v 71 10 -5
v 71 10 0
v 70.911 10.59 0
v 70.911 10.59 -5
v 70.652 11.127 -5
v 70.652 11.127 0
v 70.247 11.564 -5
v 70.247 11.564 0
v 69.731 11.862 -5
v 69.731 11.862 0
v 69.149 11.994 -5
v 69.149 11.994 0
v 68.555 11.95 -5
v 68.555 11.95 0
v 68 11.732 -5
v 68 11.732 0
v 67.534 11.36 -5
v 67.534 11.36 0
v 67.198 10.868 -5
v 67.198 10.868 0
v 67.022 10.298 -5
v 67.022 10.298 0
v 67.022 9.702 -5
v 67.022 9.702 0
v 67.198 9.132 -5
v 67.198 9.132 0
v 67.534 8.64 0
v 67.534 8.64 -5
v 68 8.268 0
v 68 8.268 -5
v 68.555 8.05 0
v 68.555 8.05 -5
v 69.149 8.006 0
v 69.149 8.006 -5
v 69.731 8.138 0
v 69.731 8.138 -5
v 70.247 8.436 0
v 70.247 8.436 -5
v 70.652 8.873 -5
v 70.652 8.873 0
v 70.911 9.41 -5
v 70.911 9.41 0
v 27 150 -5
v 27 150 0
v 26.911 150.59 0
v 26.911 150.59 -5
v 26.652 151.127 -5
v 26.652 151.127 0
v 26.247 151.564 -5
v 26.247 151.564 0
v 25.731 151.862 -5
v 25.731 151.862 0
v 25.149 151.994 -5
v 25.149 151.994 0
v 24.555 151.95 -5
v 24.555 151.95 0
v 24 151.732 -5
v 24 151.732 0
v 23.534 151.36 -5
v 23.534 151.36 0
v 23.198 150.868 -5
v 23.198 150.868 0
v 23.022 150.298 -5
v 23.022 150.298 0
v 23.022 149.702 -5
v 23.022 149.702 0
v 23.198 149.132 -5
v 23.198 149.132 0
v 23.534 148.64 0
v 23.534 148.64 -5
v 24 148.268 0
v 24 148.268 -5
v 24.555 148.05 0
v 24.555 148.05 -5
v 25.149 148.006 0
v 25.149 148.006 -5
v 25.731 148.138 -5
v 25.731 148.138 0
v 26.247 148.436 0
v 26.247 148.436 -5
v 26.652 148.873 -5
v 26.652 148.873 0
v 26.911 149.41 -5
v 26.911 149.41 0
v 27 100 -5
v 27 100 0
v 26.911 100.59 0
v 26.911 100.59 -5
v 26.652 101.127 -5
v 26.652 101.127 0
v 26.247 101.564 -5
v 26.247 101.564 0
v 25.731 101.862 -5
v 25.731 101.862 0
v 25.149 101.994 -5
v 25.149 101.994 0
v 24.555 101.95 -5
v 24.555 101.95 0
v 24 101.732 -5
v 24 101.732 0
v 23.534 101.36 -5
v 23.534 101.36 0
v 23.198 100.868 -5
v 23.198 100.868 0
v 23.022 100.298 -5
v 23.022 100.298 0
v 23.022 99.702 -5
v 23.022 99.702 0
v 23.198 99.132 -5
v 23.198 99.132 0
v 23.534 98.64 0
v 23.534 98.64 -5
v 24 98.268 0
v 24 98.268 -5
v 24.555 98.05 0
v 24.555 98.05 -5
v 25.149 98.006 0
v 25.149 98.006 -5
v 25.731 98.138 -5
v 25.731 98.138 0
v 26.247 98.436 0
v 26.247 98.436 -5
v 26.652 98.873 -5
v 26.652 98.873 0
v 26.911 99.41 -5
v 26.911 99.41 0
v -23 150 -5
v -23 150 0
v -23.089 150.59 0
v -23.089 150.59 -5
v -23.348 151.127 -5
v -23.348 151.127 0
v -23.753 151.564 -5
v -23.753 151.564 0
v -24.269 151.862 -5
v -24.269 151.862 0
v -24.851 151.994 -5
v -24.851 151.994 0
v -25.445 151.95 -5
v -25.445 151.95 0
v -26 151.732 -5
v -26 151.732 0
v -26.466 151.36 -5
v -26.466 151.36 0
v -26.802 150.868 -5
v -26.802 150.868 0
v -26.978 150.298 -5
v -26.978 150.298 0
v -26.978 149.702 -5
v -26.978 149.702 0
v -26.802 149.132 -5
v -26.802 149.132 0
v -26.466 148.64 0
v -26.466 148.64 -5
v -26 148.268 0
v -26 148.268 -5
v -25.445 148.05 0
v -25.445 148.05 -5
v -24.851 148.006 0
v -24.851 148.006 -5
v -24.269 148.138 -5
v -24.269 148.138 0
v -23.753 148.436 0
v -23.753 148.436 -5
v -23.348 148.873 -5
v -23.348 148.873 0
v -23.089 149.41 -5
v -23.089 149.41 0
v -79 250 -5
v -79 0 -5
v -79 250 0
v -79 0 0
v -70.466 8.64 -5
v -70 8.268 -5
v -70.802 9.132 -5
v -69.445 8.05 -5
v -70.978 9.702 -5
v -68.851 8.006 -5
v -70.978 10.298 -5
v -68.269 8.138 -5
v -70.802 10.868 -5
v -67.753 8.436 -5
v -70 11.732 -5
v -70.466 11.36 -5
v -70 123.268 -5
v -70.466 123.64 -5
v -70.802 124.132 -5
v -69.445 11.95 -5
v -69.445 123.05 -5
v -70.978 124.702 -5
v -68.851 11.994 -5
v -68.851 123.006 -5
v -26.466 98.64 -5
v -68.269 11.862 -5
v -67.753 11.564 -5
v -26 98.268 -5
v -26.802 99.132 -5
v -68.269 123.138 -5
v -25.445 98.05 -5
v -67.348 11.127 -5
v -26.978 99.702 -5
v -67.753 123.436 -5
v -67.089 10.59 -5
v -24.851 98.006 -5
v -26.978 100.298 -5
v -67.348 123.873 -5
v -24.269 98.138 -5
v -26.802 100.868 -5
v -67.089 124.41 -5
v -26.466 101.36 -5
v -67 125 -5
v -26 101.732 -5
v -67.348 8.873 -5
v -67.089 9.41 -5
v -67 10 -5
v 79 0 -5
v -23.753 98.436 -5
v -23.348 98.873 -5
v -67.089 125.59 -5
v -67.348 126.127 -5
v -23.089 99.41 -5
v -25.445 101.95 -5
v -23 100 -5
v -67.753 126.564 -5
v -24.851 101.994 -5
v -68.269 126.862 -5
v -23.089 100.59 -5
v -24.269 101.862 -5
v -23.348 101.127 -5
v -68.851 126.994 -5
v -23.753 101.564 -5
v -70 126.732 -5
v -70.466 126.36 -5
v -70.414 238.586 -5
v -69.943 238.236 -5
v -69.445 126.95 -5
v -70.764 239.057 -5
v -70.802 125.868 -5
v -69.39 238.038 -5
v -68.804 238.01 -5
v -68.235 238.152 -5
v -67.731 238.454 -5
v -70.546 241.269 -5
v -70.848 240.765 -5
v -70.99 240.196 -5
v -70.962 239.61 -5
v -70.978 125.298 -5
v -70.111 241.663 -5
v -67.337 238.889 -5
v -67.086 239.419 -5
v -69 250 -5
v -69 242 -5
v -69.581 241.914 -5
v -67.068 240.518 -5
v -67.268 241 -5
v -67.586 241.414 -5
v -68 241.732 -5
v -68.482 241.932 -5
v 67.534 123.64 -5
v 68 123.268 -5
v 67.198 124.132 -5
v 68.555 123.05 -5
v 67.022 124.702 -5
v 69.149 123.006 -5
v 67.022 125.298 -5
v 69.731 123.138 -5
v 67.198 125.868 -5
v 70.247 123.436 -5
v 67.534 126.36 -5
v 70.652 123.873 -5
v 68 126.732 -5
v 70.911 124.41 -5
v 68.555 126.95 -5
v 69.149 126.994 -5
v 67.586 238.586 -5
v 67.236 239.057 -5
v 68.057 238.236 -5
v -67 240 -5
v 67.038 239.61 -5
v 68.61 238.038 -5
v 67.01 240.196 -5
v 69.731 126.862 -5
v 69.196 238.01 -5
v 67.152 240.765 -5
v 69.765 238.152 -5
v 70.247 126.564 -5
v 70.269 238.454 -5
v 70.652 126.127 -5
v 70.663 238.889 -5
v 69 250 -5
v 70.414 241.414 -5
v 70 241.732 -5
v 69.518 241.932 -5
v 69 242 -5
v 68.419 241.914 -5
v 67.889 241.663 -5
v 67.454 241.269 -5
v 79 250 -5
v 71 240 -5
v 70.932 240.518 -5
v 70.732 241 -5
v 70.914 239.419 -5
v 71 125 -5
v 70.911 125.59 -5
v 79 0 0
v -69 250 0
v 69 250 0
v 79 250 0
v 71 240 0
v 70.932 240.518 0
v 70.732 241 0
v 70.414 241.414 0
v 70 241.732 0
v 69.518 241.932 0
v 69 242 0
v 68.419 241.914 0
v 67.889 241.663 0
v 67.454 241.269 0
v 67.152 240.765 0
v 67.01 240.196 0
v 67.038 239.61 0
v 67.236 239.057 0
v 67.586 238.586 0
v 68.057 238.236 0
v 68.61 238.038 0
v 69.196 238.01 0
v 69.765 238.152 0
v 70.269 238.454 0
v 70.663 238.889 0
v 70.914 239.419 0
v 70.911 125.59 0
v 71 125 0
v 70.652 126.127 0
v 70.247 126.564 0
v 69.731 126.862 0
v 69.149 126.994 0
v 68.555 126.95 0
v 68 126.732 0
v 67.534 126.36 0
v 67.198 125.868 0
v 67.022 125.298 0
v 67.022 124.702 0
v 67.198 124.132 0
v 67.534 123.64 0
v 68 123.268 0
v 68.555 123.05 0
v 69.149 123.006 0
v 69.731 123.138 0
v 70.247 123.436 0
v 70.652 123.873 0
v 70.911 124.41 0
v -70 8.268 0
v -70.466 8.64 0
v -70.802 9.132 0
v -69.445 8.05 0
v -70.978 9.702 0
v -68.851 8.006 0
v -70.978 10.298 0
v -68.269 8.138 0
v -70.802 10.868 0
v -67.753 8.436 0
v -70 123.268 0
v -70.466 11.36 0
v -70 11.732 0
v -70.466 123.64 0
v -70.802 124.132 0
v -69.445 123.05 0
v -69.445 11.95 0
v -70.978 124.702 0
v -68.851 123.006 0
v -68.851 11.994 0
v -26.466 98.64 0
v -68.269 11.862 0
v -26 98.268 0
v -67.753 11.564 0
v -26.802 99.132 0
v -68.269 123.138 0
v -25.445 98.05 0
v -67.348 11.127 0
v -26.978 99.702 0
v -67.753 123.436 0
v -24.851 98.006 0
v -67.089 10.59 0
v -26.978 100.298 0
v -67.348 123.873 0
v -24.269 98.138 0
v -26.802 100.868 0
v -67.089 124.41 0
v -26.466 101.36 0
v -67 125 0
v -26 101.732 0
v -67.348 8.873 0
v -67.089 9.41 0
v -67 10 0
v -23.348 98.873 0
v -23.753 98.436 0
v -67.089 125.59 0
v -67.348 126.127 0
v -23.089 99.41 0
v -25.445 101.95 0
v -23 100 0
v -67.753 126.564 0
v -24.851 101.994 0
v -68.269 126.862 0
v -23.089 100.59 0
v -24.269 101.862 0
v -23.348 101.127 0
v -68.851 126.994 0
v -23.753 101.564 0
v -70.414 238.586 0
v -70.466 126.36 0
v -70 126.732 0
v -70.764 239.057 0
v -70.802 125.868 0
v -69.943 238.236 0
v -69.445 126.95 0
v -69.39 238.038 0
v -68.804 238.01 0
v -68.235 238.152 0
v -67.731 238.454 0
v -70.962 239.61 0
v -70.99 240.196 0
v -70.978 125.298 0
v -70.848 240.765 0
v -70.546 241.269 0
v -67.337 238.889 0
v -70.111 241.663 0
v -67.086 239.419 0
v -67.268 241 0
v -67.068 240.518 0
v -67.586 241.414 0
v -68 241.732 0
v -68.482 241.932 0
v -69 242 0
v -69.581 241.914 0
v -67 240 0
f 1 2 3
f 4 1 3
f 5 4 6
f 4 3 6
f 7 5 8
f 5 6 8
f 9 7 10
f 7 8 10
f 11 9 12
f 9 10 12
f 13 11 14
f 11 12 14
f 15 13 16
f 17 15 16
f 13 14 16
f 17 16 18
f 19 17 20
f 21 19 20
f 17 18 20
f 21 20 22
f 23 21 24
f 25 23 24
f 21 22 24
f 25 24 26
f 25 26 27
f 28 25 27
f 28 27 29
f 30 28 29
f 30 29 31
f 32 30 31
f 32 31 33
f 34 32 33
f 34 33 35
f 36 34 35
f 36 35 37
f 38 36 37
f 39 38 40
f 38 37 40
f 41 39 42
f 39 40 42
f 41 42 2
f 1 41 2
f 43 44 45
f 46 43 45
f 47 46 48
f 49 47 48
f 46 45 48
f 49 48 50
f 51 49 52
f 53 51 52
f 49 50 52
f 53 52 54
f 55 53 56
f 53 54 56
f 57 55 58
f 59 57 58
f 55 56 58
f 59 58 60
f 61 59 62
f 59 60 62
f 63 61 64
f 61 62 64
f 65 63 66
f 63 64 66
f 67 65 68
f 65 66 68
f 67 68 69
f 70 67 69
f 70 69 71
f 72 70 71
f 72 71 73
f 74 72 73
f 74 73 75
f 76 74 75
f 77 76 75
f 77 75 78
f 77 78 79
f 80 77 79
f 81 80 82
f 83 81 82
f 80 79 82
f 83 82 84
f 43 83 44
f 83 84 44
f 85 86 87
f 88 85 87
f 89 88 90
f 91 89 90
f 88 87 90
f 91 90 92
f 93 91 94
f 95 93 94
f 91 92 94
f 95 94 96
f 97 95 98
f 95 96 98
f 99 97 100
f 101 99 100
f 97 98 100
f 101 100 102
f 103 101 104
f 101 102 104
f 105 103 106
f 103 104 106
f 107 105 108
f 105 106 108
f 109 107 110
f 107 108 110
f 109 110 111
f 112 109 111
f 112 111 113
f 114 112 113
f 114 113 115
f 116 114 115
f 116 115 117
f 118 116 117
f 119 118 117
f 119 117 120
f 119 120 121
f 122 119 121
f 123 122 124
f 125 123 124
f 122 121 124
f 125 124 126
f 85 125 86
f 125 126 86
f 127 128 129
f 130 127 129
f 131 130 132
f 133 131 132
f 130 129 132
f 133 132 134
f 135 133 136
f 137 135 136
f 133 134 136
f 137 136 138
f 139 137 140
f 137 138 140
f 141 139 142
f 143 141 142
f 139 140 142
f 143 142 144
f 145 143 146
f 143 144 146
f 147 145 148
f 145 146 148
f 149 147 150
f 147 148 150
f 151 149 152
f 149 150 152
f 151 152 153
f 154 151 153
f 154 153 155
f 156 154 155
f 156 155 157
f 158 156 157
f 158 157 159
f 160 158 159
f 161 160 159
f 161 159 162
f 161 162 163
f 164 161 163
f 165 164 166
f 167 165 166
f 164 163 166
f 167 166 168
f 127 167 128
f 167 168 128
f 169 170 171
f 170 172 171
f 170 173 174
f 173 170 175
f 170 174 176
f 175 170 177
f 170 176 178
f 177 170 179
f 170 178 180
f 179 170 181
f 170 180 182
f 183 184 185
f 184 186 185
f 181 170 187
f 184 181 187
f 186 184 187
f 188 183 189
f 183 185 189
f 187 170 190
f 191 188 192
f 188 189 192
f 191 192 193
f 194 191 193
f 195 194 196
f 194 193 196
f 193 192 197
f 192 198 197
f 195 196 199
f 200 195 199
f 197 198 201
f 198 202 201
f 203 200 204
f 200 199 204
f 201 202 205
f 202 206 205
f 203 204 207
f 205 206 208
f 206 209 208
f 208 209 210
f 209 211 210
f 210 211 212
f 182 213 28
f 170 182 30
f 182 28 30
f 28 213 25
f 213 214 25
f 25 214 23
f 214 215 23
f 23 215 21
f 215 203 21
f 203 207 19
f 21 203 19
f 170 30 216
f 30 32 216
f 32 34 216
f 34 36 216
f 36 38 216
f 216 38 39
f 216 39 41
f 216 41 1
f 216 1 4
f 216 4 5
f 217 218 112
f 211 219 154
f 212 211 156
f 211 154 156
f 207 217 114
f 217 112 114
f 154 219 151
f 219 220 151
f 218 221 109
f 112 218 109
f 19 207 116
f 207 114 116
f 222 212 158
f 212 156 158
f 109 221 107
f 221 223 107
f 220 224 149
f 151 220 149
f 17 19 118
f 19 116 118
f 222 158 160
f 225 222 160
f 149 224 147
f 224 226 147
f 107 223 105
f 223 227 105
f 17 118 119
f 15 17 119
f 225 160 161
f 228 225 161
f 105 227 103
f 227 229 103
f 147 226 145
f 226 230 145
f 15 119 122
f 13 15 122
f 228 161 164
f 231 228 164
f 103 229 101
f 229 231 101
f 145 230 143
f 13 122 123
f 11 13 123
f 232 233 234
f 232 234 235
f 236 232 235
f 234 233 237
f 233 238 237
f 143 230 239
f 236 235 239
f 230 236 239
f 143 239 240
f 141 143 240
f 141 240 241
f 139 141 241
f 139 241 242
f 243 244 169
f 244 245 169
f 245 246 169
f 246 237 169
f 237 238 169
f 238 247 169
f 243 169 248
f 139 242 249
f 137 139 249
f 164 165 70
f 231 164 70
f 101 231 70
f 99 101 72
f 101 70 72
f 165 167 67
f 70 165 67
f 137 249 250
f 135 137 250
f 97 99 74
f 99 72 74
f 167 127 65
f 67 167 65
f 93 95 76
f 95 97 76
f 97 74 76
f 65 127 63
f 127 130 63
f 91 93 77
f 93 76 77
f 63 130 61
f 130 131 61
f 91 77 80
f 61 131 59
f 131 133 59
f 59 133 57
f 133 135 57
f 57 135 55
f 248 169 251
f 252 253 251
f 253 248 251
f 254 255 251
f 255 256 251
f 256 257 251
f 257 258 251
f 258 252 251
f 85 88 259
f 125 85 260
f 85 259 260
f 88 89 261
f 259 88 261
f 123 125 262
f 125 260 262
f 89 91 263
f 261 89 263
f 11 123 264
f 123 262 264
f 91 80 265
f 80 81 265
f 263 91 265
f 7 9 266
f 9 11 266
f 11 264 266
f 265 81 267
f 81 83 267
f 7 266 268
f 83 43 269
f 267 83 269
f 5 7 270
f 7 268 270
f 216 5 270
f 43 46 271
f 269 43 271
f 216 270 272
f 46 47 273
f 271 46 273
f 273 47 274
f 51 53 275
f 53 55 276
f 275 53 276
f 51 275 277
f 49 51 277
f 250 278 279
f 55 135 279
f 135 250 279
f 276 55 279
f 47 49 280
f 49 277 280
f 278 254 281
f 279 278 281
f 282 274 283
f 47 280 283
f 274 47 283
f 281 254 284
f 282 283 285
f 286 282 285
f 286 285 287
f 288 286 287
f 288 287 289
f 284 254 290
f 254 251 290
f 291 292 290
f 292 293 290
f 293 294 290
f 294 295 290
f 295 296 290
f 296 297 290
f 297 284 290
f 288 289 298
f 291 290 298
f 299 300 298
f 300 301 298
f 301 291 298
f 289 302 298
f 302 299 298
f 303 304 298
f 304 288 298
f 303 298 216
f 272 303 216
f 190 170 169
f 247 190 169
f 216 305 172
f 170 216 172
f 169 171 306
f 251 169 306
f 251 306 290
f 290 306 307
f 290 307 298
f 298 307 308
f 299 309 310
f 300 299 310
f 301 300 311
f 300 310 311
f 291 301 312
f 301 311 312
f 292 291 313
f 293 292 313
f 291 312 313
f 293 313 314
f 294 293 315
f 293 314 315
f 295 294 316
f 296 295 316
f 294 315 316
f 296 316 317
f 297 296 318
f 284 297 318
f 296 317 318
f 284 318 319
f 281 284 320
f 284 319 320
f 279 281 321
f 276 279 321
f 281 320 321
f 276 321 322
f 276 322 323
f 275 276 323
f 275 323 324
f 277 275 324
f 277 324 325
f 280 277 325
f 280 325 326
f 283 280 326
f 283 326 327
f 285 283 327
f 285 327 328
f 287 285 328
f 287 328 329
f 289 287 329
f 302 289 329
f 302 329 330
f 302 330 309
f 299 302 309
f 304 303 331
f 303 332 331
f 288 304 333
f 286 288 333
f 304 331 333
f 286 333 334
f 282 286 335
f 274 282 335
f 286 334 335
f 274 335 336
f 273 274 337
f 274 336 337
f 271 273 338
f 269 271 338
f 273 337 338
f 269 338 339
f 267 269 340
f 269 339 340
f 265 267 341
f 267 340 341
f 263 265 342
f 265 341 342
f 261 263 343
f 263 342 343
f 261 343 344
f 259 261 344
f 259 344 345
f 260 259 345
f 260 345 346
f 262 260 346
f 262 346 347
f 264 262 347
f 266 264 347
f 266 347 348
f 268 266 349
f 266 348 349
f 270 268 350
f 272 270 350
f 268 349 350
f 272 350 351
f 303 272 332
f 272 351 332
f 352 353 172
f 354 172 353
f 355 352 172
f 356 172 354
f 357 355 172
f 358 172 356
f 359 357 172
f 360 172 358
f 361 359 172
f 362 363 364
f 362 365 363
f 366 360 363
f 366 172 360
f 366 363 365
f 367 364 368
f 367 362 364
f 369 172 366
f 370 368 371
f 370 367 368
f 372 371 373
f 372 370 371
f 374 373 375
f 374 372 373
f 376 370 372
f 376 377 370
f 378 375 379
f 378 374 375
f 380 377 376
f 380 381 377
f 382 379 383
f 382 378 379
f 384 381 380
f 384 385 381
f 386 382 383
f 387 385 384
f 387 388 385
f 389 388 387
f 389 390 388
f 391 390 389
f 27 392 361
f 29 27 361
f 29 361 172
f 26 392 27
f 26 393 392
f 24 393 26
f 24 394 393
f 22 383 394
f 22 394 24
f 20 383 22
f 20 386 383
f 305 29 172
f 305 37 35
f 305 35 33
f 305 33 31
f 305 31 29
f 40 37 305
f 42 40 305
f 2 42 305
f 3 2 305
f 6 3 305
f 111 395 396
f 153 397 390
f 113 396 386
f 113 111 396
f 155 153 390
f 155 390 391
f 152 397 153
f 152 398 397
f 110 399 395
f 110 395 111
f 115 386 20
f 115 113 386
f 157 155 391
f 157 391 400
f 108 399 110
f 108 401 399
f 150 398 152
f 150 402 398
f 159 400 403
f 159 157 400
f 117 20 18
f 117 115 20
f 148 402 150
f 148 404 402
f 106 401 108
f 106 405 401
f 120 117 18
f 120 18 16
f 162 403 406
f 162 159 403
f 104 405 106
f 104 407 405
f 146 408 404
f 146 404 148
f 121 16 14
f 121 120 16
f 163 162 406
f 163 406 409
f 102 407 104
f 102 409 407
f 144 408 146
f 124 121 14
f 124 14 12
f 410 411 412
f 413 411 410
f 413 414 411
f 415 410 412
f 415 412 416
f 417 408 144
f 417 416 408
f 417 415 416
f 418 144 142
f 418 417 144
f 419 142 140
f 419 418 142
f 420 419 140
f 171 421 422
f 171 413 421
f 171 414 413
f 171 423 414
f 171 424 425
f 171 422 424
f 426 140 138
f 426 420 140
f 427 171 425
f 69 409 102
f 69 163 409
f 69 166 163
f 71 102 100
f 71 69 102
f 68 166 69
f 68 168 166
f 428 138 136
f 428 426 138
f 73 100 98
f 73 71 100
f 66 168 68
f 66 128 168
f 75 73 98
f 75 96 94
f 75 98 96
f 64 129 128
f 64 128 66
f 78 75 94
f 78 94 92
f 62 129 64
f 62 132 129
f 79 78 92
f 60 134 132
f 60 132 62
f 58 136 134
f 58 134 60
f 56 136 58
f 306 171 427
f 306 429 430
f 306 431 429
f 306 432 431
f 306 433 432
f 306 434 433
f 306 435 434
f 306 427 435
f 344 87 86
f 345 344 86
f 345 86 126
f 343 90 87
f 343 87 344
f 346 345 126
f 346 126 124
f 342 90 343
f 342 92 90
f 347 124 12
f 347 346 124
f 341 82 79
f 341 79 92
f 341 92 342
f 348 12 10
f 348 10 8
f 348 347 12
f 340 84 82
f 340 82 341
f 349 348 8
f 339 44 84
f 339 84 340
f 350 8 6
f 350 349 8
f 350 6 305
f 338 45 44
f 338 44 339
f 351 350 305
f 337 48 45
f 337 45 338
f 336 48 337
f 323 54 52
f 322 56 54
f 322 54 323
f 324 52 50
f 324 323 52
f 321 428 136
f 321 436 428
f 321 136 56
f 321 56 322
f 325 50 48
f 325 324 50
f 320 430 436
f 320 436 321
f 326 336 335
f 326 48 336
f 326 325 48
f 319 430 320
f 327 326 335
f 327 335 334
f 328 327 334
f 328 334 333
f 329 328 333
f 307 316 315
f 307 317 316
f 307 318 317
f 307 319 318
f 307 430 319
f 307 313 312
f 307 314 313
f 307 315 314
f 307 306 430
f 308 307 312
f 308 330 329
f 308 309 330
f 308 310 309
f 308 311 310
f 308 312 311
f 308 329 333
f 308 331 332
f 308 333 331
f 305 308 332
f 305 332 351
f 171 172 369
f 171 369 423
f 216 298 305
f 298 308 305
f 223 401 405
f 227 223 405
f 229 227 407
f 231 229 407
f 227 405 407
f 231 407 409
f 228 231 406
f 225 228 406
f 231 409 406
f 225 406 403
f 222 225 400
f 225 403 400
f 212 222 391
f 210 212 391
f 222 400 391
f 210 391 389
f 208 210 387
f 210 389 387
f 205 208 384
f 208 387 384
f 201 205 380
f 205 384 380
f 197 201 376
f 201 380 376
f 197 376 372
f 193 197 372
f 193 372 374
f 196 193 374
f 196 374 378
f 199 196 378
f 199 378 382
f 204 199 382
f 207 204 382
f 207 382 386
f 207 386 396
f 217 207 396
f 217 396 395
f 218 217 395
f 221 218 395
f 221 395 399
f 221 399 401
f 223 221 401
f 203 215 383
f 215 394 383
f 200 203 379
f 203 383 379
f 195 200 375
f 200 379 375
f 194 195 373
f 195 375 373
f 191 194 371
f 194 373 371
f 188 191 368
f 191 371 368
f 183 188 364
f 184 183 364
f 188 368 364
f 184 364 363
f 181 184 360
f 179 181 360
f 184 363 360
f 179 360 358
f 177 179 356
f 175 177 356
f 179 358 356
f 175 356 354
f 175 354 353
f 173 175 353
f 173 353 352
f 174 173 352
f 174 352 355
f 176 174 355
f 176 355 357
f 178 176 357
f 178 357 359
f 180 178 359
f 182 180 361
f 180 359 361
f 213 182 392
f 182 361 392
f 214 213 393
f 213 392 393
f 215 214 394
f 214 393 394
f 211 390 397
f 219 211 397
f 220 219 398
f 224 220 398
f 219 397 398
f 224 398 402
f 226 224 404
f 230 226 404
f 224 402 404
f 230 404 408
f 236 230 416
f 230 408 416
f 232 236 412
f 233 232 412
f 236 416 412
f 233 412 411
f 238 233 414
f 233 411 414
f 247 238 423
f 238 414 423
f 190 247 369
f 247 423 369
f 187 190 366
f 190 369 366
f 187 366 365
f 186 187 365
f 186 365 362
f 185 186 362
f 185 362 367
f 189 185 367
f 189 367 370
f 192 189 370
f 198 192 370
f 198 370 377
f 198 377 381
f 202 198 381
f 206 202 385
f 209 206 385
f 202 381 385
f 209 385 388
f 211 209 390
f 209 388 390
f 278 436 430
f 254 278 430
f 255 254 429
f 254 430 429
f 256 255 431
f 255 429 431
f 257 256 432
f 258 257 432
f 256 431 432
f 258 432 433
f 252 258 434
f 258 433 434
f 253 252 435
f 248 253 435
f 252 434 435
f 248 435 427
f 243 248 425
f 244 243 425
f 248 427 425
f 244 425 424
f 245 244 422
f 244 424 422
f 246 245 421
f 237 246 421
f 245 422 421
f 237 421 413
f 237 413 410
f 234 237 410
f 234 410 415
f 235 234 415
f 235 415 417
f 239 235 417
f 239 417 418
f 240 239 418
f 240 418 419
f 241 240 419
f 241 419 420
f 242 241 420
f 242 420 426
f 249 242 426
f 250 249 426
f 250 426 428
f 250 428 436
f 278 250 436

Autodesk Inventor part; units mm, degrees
ref_plane "YZ Plane" through (0, 0, 0) normal (1, 0, 0) x (0, 1, 0)
ref_plane "XZ Plane" through (0, 0, 0) normal (0, 1, 0) x (-1, 0, 0)
ref_plane "XY Plane" through (0, 0, 0) normal (0, 0, 1) x (1, 0, 0)
sketch "Esquisse1" plane through (0, 0, 0) normal (0, 0, 1) x (1, 0, 0)
  line L0 (0, 0) -> (-79, 0)
  line L1 (-79, 0) -> (-79, 250)
  line L2 (-79, 250) -> (79, 250)
  line L3 (79, 250) -> (79, 0)
  line L4 (79, 0) -> (0, 0)
  line L5 (-69, 250) -> (-69, 240)
  line L6 (-69, 240) -> (-69, 125) construction
  line L7 (-69, 125) -> (-69, 10) construction
  line L8 (-69, 10) -> (-69, 0)
  line L9 (69, 0) -> (69, 10)
  line L10 (69, 10) -> (69, 125) construction
  line L11 (69, 125) -> (69, 240) construction
  line L12 (69, 240) -> (69, 250)
  circle A0 centre (-69, 240) radius 2
  circle A1 centre (69, 240) radius 2
  circle A2 centre (69, 125) radius 2
  circle A3 centre (-69, 125) radius 2
  circle A4 centre (-69, 10) radius 2
  circle A5 centre (69, 10) radius 2
  line L13 (-69, 10) -> (-79, 10)
  line L14 (69, 10) -> (79, 10)
  line L15 (25, 150) -> (-25, 150) construction
  line L16 (-25, 150) -> (-25, 100) construction
  line L17 (-25, 100) -> (25, 100) construction
  line L18 (25, 100) -> (25, 150) construction
  line L19 (25, 150) -> (-25, 100) construction
  line L20 (-25, 150) -> (25, 100) construction
  line L21 (-69, 125) -> (69, 125) construction
  circle A6 centre (-25, 150) radius 2
  circle A7 centre (25, 150) radius 2
  circle A8 centre (25, 100) radius 2
  circle A9 centre (-25, 100) radius 2
  point P0 (0, 125)
  dimension "d0" = 250
  dimension "d3" = 158
  dimension "d4" = 10
  dimension "d5" = 4
  dimension "d8" = 4
  dimension "d9" = 50
  dimension "d10" = 50
extrude "Extrusion1" add sketch "Esquisse1" against normal blind 5 contours L0 L8 A4 L13 L1 L2 L3 L14 A5 L9 L4 | L0 L1 L13 A4 L8 | L9 A5 L14 L3 L4
properties part number "Plaque arrière"
